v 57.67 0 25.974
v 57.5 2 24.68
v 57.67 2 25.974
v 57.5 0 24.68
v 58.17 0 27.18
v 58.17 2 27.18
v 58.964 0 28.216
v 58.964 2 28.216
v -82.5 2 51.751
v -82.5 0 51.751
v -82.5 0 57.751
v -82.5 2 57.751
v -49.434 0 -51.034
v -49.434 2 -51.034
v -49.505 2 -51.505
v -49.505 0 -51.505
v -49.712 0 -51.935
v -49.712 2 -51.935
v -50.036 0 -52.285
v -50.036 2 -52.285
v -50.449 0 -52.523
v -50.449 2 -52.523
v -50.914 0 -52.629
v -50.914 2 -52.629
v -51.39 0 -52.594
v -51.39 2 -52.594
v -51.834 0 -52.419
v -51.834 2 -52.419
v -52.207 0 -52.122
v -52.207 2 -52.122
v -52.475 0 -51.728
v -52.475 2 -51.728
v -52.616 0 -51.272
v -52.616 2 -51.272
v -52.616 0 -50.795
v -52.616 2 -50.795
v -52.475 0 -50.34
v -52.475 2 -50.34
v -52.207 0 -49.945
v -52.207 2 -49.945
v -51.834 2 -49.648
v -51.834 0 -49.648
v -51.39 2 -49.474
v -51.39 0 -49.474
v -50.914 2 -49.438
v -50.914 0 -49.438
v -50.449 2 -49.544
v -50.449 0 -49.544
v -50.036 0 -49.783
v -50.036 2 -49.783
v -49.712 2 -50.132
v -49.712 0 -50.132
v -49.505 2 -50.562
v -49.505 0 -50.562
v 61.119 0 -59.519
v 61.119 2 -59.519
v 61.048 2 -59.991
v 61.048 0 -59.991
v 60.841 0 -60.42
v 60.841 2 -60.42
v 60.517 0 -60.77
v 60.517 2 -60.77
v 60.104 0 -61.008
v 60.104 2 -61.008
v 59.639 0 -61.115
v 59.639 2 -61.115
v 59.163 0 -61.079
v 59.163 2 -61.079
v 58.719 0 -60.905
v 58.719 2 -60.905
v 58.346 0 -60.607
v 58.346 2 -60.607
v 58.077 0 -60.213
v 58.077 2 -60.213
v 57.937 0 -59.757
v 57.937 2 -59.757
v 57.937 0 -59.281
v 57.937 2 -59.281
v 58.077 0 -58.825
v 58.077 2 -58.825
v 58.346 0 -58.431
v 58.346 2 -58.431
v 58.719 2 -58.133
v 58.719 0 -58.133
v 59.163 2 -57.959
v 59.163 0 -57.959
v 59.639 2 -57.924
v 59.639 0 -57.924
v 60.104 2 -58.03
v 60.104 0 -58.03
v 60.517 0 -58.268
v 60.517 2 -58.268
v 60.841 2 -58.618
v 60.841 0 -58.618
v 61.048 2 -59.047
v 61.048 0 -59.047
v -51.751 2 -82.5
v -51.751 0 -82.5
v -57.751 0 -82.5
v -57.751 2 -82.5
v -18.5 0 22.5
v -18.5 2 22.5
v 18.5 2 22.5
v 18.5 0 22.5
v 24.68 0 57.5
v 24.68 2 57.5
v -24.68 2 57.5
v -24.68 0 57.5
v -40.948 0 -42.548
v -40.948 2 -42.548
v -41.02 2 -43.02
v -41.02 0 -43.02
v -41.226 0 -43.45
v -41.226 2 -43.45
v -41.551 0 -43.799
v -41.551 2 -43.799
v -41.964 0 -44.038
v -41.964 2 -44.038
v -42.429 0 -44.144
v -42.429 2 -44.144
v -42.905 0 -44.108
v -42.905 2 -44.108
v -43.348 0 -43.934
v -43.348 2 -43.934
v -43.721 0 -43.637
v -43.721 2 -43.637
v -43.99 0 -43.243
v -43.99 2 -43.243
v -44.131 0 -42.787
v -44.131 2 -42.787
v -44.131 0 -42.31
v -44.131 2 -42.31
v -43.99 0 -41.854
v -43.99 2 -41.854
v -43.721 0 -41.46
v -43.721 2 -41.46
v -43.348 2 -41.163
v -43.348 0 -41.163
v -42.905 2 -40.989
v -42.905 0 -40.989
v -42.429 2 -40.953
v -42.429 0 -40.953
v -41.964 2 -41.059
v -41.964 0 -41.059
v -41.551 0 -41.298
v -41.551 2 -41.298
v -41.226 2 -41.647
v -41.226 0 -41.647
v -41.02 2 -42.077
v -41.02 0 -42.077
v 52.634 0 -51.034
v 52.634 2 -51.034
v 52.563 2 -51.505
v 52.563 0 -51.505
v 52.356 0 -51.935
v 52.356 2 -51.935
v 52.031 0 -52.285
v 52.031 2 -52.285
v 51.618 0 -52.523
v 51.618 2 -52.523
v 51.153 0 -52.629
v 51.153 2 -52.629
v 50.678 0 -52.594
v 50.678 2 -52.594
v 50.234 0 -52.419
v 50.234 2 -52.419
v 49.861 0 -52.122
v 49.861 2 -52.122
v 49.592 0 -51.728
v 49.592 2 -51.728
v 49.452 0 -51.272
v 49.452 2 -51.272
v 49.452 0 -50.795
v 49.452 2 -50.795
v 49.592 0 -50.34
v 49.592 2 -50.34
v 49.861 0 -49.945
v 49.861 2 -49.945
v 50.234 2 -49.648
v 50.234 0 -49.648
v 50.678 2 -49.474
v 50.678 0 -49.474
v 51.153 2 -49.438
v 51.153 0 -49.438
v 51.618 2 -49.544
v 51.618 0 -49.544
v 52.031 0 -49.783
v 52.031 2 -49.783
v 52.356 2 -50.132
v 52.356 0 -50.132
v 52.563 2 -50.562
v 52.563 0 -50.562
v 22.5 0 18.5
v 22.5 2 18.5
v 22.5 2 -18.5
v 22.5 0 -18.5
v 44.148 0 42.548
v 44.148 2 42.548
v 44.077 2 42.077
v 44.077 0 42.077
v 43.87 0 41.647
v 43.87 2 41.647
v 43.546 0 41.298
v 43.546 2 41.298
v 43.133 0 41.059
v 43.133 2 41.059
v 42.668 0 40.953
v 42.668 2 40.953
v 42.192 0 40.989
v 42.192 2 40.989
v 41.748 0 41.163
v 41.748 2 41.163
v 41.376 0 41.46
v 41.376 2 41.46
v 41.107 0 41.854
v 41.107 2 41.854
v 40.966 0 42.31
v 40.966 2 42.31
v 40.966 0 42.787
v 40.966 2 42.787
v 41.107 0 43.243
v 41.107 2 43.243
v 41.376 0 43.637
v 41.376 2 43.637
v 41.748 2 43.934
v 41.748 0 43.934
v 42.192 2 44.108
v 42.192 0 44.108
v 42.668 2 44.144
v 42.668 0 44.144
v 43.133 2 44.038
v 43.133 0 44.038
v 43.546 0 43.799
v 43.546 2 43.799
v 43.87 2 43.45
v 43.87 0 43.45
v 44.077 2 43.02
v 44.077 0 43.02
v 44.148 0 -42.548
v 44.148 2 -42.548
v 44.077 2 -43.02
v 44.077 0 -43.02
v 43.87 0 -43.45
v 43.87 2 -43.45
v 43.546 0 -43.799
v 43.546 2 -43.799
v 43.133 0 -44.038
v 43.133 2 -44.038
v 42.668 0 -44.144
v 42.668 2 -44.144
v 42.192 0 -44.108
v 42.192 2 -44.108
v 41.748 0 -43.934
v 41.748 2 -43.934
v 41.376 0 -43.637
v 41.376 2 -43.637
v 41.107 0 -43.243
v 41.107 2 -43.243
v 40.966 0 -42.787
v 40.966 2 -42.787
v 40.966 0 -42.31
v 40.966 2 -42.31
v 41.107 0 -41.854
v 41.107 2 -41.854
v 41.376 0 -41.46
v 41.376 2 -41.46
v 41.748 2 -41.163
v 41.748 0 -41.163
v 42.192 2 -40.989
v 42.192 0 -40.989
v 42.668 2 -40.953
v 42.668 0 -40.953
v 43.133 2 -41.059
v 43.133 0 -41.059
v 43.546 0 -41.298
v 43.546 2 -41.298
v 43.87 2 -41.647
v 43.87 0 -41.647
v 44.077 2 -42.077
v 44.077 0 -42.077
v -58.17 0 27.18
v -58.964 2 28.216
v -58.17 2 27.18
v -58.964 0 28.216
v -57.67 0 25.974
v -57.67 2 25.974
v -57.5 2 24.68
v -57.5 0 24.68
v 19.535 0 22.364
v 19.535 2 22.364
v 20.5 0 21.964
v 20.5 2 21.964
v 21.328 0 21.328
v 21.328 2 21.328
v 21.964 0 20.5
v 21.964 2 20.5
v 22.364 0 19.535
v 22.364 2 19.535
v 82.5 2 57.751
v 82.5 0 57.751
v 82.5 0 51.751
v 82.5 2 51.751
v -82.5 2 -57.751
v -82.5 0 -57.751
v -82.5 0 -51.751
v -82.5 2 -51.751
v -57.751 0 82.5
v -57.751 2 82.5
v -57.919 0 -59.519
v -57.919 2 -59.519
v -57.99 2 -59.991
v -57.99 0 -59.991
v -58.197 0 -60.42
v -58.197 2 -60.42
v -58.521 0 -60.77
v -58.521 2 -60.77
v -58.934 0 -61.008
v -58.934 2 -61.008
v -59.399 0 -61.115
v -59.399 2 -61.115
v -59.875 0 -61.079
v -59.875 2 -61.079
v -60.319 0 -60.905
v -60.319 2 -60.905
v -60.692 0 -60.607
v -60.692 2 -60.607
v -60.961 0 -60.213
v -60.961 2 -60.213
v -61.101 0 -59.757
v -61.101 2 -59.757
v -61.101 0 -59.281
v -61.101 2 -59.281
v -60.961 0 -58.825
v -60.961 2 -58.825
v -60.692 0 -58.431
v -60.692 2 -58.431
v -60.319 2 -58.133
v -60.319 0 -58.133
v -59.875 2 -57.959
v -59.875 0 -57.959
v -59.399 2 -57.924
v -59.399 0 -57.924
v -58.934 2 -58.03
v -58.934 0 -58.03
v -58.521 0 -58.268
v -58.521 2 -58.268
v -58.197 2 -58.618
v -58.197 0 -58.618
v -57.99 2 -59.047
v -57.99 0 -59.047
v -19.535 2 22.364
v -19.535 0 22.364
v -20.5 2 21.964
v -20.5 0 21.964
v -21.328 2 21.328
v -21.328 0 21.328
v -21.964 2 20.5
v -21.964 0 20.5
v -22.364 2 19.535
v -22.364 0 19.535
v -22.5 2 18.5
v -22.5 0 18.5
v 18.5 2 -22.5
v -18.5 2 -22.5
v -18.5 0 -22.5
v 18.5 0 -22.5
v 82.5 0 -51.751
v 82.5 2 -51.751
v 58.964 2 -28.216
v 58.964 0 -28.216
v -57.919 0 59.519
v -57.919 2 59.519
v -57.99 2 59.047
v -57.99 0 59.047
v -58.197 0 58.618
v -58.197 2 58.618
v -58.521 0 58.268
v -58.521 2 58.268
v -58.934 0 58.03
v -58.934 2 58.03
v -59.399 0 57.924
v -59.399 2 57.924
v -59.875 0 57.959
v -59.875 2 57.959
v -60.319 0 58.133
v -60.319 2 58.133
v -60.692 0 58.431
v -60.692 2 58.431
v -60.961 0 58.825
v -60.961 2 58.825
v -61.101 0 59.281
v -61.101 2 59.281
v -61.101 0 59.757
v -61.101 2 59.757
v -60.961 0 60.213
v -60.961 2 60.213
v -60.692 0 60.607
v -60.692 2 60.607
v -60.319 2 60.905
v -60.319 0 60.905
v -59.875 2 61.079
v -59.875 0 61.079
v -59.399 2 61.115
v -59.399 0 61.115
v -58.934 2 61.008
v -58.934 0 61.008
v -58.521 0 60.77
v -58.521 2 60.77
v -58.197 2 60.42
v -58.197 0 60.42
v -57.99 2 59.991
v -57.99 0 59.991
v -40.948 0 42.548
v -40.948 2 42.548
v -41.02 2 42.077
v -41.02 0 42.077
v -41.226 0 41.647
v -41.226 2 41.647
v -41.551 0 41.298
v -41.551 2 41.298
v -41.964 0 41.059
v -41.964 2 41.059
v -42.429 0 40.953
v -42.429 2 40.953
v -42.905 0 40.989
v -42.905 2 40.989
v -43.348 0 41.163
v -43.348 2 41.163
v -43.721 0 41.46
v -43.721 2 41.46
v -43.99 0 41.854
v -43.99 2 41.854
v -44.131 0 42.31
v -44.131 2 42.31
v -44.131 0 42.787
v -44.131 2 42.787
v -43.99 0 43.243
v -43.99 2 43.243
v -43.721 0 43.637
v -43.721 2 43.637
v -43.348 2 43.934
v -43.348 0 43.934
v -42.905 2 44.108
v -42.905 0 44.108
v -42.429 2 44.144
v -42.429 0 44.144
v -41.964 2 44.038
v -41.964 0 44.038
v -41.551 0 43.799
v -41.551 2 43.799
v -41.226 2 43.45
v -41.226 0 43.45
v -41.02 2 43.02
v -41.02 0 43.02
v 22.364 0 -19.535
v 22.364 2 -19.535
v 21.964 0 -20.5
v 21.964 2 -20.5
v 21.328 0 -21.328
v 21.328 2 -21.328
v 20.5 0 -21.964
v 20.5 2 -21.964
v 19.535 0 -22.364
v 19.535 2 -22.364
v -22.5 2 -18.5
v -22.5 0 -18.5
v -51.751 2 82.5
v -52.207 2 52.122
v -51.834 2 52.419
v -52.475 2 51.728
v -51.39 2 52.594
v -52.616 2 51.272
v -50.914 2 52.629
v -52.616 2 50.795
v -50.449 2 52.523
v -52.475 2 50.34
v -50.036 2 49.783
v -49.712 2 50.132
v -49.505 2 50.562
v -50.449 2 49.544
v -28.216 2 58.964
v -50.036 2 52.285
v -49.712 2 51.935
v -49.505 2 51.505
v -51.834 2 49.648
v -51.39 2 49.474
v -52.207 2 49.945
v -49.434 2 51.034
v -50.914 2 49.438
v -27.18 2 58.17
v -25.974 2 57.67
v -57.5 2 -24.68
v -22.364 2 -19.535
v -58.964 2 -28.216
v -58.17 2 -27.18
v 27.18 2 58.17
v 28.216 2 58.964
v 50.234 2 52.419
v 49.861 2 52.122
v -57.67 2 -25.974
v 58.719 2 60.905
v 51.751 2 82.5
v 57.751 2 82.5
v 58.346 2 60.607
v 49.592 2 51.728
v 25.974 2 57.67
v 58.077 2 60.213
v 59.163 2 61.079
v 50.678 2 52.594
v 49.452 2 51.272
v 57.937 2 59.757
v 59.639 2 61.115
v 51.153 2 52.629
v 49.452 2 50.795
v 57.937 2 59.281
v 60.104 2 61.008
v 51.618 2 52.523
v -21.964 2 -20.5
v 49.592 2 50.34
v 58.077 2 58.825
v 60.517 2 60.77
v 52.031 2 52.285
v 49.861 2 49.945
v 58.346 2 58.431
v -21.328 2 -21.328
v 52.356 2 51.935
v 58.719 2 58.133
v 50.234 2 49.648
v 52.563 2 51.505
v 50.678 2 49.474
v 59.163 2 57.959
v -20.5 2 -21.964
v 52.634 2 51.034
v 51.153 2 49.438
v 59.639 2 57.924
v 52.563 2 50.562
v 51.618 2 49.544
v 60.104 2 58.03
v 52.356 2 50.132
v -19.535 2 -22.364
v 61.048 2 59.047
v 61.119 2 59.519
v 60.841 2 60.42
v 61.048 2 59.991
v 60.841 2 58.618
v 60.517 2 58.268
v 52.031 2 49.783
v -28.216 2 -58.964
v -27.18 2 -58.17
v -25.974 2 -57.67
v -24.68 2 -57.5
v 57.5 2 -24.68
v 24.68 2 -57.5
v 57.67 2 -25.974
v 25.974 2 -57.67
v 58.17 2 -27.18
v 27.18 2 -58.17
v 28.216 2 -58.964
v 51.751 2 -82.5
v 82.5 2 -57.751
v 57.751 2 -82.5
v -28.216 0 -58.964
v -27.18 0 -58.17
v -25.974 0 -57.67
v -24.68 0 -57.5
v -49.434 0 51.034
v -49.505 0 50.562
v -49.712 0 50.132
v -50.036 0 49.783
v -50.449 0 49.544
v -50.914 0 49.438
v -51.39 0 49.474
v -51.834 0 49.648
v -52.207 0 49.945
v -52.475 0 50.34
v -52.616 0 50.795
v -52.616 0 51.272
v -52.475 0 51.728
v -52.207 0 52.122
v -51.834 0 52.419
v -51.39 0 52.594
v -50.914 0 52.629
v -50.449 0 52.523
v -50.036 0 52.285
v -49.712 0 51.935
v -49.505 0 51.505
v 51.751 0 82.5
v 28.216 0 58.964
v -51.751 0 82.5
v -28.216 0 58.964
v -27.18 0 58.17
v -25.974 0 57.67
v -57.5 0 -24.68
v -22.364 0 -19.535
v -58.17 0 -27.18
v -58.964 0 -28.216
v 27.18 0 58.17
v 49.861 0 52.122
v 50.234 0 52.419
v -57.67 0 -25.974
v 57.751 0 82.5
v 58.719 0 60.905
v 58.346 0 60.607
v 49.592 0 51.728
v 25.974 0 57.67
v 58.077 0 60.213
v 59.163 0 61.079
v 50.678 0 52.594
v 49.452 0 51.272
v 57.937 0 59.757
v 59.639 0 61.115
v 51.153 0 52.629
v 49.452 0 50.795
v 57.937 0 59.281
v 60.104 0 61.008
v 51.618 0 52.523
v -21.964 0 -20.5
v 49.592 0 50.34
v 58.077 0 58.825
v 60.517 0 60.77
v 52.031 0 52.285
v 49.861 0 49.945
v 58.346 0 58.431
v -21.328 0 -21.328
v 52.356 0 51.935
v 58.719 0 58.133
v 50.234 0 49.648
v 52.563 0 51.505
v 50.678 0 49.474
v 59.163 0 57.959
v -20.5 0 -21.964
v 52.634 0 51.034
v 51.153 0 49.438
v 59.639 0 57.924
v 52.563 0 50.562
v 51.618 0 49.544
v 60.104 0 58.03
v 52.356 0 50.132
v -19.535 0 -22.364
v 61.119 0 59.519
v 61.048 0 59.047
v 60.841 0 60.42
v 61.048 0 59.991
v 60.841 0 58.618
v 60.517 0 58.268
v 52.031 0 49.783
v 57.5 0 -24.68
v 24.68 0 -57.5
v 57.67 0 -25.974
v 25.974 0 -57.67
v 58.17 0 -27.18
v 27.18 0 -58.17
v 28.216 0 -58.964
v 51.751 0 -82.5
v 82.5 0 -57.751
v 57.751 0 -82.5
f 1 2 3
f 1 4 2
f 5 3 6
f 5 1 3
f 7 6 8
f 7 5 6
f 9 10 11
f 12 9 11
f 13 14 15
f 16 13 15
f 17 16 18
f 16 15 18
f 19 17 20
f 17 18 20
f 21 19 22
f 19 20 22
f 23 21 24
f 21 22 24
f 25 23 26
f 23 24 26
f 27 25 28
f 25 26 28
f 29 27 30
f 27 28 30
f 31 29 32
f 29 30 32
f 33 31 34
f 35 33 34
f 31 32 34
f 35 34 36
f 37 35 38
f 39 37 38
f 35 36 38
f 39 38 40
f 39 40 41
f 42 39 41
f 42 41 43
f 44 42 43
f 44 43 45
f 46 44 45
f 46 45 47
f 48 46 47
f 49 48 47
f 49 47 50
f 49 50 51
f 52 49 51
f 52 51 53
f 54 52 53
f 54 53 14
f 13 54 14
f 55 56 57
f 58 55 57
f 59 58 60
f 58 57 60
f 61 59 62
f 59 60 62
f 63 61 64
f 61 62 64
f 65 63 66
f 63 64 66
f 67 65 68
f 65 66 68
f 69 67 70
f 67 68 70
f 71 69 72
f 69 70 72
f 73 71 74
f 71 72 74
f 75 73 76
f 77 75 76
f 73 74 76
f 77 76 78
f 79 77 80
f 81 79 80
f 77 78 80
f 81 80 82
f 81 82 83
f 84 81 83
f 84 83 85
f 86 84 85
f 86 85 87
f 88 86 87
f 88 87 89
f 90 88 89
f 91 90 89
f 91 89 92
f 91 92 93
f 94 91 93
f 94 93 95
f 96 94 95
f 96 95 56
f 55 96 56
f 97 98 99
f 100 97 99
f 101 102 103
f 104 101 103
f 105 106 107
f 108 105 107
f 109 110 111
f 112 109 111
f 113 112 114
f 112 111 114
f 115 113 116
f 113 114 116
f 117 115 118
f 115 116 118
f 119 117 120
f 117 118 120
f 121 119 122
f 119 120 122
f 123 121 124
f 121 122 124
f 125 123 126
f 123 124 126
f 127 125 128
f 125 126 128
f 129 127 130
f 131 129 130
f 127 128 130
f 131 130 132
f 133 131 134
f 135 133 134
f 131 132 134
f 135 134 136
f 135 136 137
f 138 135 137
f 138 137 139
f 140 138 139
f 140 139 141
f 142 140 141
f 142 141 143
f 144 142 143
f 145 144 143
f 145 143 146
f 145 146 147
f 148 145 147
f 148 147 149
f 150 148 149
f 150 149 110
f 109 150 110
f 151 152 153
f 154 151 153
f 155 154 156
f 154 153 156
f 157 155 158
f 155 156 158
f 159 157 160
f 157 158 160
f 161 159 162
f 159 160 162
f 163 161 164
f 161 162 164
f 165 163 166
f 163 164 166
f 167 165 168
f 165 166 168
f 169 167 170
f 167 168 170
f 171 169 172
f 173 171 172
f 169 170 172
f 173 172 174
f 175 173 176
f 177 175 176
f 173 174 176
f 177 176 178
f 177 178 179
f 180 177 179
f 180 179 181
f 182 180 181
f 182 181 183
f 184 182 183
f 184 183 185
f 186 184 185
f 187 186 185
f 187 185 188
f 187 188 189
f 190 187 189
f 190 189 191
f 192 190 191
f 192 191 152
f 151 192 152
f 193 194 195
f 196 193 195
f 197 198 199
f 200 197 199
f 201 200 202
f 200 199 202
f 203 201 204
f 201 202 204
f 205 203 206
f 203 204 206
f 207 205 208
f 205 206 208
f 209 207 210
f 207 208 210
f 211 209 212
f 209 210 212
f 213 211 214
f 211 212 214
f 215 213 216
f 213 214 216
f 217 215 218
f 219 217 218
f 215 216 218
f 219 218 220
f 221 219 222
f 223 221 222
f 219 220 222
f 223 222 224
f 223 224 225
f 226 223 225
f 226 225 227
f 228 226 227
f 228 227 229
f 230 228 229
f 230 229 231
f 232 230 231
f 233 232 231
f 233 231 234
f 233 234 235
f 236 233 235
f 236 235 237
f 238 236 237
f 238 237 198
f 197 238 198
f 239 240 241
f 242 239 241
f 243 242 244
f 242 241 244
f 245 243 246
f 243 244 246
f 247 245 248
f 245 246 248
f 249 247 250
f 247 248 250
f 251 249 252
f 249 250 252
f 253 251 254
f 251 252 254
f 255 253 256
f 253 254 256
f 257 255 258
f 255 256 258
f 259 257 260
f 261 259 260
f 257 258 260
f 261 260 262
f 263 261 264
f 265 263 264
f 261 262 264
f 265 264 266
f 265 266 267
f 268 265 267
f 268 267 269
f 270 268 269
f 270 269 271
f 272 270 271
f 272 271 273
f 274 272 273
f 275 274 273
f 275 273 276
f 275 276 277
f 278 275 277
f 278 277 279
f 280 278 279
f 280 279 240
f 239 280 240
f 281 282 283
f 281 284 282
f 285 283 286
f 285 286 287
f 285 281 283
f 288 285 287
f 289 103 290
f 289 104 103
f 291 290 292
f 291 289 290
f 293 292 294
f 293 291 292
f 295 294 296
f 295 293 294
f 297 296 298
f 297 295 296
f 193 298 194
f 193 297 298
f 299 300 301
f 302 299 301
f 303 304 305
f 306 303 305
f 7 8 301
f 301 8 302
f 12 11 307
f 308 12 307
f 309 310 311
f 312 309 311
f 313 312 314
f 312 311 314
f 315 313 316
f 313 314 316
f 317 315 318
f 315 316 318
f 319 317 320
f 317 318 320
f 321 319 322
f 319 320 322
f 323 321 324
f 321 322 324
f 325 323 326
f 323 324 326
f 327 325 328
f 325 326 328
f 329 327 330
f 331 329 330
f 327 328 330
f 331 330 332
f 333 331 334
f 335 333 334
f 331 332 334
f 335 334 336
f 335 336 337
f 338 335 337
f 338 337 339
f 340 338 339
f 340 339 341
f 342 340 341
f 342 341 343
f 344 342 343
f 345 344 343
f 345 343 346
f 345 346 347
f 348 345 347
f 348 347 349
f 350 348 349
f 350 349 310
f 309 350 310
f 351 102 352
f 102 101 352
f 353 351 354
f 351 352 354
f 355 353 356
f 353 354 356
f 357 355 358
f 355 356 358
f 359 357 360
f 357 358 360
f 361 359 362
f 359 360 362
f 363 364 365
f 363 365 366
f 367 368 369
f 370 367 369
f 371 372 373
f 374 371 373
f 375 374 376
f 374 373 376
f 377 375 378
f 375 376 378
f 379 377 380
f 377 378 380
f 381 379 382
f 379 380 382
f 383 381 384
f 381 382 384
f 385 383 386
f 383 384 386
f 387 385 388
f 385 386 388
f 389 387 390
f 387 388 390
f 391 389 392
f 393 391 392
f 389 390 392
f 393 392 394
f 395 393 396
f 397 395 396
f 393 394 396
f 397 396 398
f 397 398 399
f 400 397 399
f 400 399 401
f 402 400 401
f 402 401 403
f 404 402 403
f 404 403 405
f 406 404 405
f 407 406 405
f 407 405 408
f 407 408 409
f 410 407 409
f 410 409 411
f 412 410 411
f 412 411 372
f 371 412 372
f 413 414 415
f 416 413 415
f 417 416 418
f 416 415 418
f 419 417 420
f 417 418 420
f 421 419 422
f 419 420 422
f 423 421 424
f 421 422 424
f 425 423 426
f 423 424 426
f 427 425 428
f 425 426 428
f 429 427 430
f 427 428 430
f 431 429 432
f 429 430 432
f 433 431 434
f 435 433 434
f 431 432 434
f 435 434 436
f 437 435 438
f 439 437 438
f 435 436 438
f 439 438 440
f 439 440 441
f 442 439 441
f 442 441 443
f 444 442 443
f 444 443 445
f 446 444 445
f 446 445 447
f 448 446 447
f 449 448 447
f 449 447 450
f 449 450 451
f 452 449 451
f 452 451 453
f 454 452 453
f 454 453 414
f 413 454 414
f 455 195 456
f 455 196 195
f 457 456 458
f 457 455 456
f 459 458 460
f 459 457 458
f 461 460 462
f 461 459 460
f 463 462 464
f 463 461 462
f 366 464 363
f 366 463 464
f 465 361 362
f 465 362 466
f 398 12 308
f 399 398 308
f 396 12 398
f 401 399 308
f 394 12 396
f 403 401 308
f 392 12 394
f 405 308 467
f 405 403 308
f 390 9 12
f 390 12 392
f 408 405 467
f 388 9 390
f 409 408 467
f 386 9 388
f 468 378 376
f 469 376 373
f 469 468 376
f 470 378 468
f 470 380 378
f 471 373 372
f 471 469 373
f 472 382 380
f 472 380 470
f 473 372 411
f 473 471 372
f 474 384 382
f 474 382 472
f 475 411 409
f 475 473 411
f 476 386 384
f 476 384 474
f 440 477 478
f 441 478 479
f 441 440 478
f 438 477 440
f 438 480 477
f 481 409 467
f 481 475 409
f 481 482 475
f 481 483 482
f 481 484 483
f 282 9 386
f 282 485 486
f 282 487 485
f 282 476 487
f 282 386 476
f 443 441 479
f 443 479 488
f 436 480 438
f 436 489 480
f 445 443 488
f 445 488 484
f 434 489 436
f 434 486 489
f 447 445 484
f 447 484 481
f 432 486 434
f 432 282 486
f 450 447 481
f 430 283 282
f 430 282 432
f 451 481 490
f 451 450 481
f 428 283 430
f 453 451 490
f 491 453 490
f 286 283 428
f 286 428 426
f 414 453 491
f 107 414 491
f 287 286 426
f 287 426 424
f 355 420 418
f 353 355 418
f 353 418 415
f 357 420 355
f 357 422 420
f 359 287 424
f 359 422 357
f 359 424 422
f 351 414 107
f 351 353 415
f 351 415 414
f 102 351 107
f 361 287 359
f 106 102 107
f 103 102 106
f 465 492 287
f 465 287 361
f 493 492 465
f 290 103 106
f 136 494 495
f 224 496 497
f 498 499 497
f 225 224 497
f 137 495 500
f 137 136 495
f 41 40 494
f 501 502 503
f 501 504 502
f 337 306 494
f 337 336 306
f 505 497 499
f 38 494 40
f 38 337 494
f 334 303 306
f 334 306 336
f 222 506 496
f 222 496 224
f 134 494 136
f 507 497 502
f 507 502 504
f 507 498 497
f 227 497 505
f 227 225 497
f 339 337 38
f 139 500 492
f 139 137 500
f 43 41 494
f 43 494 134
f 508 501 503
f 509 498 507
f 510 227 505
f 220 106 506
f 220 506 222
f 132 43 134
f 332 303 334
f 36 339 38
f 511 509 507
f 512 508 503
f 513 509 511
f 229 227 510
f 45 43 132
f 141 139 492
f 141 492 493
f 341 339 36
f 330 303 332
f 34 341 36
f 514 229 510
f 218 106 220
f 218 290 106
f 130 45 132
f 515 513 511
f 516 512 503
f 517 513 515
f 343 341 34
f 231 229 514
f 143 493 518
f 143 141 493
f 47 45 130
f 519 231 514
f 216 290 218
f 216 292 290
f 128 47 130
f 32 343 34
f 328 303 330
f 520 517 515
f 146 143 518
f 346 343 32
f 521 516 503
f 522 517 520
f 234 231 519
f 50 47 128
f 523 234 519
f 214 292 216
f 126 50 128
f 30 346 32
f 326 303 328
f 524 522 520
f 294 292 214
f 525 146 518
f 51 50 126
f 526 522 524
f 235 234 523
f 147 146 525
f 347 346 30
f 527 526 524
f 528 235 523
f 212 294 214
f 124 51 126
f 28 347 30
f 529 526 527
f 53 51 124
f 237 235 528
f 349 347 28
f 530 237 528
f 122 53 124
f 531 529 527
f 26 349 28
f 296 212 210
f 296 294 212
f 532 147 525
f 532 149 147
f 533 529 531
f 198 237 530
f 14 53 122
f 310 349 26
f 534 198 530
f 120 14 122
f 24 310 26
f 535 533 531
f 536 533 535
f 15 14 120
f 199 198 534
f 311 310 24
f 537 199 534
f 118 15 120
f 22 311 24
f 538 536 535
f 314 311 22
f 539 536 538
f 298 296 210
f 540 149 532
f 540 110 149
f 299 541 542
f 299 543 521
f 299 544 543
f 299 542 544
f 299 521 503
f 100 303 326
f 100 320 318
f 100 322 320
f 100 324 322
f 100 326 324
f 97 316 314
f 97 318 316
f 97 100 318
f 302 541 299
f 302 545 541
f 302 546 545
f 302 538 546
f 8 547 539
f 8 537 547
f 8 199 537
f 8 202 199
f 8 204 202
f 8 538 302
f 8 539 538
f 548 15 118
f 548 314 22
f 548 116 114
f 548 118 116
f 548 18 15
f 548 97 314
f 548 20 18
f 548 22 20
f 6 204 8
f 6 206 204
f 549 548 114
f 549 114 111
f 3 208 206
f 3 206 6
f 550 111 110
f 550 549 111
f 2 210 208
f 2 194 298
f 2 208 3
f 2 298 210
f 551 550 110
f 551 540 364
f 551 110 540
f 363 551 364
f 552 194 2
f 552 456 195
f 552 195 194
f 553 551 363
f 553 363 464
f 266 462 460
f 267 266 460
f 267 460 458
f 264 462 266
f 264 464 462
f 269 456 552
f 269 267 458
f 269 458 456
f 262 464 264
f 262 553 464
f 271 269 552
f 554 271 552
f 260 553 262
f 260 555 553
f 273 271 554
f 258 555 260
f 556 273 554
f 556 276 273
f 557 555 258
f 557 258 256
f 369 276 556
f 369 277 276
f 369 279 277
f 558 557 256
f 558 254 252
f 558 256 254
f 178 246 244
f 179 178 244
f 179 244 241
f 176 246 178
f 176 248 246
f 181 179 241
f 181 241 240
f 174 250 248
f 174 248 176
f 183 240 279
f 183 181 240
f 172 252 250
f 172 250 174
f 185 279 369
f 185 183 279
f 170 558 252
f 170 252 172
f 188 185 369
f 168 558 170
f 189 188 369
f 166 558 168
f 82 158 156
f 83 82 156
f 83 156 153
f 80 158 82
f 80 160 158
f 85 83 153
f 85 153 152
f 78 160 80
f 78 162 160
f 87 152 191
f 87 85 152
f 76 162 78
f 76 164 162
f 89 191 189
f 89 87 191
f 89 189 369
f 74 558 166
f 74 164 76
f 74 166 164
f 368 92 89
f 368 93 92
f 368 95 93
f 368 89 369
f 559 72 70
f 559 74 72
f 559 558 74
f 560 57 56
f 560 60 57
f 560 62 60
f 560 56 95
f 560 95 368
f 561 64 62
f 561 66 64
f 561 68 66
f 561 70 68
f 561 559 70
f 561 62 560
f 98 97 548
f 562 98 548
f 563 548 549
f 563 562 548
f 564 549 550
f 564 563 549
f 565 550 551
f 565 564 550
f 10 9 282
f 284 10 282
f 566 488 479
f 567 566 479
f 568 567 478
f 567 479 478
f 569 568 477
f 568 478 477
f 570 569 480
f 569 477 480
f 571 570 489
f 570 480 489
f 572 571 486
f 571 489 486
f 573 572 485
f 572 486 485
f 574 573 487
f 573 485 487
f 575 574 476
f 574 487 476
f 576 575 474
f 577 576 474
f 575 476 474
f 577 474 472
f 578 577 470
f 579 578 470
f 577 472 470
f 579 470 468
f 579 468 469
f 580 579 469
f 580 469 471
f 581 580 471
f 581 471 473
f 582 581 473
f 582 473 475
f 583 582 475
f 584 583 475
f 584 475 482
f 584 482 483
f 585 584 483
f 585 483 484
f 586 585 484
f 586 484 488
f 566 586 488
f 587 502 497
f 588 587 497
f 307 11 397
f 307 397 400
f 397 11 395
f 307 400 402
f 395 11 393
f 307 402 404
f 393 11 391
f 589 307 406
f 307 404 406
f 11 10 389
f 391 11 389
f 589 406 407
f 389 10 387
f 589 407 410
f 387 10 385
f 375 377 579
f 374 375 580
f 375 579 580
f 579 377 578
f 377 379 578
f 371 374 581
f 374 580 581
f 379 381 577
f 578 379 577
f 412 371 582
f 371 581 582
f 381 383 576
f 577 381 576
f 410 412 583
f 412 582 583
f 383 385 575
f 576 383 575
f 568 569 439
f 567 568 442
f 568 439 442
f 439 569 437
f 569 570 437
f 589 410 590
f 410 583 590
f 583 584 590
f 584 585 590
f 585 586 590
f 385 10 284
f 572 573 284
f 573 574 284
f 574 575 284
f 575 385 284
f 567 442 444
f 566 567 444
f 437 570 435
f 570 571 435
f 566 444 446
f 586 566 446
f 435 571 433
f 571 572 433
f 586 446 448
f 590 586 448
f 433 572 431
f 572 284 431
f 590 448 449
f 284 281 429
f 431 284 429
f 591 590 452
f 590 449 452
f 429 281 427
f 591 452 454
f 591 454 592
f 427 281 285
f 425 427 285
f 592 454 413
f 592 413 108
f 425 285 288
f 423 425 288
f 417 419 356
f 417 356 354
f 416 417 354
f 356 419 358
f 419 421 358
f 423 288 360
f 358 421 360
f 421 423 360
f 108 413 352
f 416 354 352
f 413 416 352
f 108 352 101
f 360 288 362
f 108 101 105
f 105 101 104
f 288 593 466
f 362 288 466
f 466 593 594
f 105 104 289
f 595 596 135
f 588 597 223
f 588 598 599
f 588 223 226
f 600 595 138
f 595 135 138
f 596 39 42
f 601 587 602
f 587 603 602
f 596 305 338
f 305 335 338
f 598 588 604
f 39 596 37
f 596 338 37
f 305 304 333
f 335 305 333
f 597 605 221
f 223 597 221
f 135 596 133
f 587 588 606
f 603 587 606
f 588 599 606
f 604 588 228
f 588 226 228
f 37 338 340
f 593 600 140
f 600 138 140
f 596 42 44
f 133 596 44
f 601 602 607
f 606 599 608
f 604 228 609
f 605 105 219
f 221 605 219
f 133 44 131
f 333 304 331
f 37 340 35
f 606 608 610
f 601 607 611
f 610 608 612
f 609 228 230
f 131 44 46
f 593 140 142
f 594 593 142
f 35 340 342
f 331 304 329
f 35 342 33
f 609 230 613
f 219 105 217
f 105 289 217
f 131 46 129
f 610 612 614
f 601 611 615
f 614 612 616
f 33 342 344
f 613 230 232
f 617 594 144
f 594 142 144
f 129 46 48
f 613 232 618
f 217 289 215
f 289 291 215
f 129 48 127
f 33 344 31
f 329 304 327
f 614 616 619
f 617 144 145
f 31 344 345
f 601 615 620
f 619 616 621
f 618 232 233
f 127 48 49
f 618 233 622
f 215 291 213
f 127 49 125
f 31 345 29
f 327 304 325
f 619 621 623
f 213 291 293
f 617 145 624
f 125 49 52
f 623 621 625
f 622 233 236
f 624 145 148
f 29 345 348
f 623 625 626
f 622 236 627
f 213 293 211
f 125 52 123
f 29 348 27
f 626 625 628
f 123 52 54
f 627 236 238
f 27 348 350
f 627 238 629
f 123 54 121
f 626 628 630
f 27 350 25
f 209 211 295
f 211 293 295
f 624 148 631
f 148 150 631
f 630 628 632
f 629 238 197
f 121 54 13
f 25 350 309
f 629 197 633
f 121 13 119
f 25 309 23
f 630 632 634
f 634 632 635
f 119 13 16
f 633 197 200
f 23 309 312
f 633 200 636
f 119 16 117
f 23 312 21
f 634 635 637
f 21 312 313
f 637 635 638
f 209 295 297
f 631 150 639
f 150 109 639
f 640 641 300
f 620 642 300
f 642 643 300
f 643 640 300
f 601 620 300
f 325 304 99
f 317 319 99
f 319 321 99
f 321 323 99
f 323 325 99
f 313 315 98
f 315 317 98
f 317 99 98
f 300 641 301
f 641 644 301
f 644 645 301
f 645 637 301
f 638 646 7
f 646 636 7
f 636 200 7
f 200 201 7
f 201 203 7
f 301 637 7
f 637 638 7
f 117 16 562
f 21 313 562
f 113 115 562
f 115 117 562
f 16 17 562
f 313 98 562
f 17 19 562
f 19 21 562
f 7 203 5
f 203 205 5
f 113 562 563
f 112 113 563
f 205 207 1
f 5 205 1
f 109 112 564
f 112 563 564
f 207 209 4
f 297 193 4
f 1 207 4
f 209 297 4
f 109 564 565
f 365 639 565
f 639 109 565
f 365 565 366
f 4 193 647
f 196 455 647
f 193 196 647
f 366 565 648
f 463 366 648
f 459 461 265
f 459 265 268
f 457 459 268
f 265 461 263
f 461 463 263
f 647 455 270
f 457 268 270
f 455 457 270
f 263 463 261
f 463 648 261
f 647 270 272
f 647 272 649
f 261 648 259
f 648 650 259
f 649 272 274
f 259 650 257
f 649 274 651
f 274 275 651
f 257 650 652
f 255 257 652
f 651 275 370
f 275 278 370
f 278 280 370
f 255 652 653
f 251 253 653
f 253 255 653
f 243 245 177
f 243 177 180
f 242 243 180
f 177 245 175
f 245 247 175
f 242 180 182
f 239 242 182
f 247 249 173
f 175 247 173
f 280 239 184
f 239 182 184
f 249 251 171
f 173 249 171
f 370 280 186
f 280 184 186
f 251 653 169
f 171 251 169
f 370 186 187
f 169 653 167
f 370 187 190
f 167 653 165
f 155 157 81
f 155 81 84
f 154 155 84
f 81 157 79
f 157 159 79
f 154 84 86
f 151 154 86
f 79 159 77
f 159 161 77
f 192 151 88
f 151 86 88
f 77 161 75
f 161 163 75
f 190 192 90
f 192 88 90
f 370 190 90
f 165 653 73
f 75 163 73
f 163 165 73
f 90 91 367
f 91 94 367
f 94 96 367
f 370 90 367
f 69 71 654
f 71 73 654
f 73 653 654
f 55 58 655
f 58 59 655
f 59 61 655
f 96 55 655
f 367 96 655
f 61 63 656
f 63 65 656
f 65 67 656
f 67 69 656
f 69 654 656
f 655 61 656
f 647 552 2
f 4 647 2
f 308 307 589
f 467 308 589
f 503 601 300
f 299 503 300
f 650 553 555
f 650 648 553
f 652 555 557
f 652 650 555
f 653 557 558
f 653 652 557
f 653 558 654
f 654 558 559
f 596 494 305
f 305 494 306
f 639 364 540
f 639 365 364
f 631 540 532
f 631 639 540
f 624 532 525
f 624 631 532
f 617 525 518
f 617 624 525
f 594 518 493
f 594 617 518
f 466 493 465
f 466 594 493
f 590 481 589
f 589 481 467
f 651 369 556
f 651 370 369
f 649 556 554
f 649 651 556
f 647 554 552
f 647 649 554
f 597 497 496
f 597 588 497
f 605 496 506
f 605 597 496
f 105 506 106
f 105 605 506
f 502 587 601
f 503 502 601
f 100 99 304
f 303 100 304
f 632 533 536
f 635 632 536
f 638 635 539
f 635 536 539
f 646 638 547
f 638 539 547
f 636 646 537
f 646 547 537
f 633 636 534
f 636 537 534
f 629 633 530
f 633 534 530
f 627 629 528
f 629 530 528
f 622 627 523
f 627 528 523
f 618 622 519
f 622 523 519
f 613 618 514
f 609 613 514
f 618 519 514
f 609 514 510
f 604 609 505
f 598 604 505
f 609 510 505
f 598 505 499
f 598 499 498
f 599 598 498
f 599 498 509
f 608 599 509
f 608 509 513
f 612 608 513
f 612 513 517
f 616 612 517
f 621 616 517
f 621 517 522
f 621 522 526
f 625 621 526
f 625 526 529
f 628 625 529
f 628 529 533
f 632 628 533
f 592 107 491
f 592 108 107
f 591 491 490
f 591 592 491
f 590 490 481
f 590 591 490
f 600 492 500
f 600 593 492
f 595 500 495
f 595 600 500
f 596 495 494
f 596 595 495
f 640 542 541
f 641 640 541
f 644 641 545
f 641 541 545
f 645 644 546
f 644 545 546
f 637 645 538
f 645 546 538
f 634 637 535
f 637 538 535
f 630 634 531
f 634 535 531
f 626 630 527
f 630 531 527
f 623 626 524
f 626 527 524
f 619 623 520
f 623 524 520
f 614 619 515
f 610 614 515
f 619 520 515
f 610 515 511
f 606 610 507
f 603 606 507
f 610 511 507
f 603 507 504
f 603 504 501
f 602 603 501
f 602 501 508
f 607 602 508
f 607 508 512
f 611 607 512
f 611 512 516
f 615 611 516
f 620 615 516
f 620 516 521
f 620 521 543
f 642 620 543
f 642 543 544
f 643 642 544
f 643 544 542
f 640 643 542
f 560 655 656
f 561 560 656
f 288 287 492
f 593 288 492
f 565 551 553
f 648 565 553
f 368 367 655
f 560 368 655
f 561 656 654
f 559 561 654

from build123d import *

# Parameters (mm, degrees)
BOSS_EXTRUDE1_DEPTH  = 2
SKETCH2_W            = 45
SKETCH2_H            = 45
CUT_EXTRUDE1_DEPTH   = 117.689759619
FILLET1_R            = 4
CUT_EXTRUDE2_DEPTH   = 117.689759619
FILLET2_R            = 5
M3_CLEARANCE_HOLE1_D = 3.2


with BuildPart() as part:
    # Sketch1 → Boss-Extrude1 (new body)
    with BuildSketch(Plane(origin=(0, 0, 0), x_dir=(1, 0, 0), z_dir=(0, 1, 0))):
        Polygon((-57.751262658, 82.5), (-82.5, 57.751262658), (-82.5, -57.751262658), (-57.751262658, -82.5), (57.751262658, -82.5), (82.5, -57.751262658), (82.5, 57.751262658), (57.751262658, 82.5), align=None)
    extrude(amount=BOSS_EXTRUDE1_DEPTH)

    # Sketch2 → Cut-Extrude1 (cut, through all)
    with BuildSketch(Plane(origin=(0, 2, 0), x_dir=(1, 0, 0), z_dir=(0, 1, 0))):
        Rectangle(SKETCH2_W, SKETCH2_H)
    extrude(amount=-CUT_EXTRUDE1_DEPTH, mode=Mode.SUBTRACT)

    # Fillet1
    fillet1_edges = [part.edges().sort_by_distance(p)[0] for p in [
        (22.5, 1, -22.5),
        (22.5, 1, 22.5),
        (-22.5, 1, 22.5),
        (-22.5, 1, -22.5),
    ]]
    fillet(fillet1_edges, radius=FILLET1_R)

    # Sketch3 → Cut-Extrude2 (cut, through all)
    with BuildSketch(Plane(origin=(0, 2, 0), x_dir=(1, 0, 0), z_dir=(0, 1, 0))):
        Polygon((57.5, -26.751262658), (82.5, -51.751262658), (82.5, 51.751262658), (57.5, 26.751262658), align=None)
        Polygon((-51.751262658, -82.5), (51.751262658, -82.5), (26.751262658, -57.5), (-26.751262658, -57.5), align=None)
        Polygon((-57.5, 26.751262658), (-82.5, 51.751262658), (-82.5, -51.751262658), (-57.5, -26.751262658), align=None)
        Polygon((26.751262658, 57.5), (51.751262658, 82.5), (-51.751262658, 82.5), (-26.751262658, 57.5), align=None)
    extrude(amount=-CUT_EXTRUDE2_DEPTH, mode=Mode.SUBTRACT)

    # Fillet2
    fillet2_edges = [part.edges().sort_by_distance(p)[0] for p in [
        (-26.751262658, 1, -57.5),
        (26.751262658, 1, -57.5),
        (57.5, 1, 26.751262658),
        (57.5, 1, -26.751262658),
        (-26.751262658, 1, 57.5),
        (26.751262658, 1, 57.5),
        (-57.5, 1, -26.751262658),
        (-57.5, 1, 26.751262658),
    ]]
    fillet(fillet2_edges, radius=FILLET2_R)

    # M3 Clearance Hole1 (through all)
    with Locations(Plane(origin=(0, 0, 0), x_dir=(-1, 0, 0), z_dir=(0, -1, 0))):
        with Locations((-59.519029611, 59.519029611), (59.519029611, -59.519029611), (51.033748237, -51.033748237), (42.548466863, -42.548466863), (-59.519029611, -59.519029611), (-51.033748237, -51.033748237), (-42.548466863, -42.548466863), (59.519029611, 59.519029611), (51.033748237, 51.033748237), (42.548466863, 42.548466863), (-42.548466863, 42.548466863), (-51.033748237, 51.033748237)):
            Hole(M3_CLEARANCE_HOLE1_D / 2)


solid = part.part
